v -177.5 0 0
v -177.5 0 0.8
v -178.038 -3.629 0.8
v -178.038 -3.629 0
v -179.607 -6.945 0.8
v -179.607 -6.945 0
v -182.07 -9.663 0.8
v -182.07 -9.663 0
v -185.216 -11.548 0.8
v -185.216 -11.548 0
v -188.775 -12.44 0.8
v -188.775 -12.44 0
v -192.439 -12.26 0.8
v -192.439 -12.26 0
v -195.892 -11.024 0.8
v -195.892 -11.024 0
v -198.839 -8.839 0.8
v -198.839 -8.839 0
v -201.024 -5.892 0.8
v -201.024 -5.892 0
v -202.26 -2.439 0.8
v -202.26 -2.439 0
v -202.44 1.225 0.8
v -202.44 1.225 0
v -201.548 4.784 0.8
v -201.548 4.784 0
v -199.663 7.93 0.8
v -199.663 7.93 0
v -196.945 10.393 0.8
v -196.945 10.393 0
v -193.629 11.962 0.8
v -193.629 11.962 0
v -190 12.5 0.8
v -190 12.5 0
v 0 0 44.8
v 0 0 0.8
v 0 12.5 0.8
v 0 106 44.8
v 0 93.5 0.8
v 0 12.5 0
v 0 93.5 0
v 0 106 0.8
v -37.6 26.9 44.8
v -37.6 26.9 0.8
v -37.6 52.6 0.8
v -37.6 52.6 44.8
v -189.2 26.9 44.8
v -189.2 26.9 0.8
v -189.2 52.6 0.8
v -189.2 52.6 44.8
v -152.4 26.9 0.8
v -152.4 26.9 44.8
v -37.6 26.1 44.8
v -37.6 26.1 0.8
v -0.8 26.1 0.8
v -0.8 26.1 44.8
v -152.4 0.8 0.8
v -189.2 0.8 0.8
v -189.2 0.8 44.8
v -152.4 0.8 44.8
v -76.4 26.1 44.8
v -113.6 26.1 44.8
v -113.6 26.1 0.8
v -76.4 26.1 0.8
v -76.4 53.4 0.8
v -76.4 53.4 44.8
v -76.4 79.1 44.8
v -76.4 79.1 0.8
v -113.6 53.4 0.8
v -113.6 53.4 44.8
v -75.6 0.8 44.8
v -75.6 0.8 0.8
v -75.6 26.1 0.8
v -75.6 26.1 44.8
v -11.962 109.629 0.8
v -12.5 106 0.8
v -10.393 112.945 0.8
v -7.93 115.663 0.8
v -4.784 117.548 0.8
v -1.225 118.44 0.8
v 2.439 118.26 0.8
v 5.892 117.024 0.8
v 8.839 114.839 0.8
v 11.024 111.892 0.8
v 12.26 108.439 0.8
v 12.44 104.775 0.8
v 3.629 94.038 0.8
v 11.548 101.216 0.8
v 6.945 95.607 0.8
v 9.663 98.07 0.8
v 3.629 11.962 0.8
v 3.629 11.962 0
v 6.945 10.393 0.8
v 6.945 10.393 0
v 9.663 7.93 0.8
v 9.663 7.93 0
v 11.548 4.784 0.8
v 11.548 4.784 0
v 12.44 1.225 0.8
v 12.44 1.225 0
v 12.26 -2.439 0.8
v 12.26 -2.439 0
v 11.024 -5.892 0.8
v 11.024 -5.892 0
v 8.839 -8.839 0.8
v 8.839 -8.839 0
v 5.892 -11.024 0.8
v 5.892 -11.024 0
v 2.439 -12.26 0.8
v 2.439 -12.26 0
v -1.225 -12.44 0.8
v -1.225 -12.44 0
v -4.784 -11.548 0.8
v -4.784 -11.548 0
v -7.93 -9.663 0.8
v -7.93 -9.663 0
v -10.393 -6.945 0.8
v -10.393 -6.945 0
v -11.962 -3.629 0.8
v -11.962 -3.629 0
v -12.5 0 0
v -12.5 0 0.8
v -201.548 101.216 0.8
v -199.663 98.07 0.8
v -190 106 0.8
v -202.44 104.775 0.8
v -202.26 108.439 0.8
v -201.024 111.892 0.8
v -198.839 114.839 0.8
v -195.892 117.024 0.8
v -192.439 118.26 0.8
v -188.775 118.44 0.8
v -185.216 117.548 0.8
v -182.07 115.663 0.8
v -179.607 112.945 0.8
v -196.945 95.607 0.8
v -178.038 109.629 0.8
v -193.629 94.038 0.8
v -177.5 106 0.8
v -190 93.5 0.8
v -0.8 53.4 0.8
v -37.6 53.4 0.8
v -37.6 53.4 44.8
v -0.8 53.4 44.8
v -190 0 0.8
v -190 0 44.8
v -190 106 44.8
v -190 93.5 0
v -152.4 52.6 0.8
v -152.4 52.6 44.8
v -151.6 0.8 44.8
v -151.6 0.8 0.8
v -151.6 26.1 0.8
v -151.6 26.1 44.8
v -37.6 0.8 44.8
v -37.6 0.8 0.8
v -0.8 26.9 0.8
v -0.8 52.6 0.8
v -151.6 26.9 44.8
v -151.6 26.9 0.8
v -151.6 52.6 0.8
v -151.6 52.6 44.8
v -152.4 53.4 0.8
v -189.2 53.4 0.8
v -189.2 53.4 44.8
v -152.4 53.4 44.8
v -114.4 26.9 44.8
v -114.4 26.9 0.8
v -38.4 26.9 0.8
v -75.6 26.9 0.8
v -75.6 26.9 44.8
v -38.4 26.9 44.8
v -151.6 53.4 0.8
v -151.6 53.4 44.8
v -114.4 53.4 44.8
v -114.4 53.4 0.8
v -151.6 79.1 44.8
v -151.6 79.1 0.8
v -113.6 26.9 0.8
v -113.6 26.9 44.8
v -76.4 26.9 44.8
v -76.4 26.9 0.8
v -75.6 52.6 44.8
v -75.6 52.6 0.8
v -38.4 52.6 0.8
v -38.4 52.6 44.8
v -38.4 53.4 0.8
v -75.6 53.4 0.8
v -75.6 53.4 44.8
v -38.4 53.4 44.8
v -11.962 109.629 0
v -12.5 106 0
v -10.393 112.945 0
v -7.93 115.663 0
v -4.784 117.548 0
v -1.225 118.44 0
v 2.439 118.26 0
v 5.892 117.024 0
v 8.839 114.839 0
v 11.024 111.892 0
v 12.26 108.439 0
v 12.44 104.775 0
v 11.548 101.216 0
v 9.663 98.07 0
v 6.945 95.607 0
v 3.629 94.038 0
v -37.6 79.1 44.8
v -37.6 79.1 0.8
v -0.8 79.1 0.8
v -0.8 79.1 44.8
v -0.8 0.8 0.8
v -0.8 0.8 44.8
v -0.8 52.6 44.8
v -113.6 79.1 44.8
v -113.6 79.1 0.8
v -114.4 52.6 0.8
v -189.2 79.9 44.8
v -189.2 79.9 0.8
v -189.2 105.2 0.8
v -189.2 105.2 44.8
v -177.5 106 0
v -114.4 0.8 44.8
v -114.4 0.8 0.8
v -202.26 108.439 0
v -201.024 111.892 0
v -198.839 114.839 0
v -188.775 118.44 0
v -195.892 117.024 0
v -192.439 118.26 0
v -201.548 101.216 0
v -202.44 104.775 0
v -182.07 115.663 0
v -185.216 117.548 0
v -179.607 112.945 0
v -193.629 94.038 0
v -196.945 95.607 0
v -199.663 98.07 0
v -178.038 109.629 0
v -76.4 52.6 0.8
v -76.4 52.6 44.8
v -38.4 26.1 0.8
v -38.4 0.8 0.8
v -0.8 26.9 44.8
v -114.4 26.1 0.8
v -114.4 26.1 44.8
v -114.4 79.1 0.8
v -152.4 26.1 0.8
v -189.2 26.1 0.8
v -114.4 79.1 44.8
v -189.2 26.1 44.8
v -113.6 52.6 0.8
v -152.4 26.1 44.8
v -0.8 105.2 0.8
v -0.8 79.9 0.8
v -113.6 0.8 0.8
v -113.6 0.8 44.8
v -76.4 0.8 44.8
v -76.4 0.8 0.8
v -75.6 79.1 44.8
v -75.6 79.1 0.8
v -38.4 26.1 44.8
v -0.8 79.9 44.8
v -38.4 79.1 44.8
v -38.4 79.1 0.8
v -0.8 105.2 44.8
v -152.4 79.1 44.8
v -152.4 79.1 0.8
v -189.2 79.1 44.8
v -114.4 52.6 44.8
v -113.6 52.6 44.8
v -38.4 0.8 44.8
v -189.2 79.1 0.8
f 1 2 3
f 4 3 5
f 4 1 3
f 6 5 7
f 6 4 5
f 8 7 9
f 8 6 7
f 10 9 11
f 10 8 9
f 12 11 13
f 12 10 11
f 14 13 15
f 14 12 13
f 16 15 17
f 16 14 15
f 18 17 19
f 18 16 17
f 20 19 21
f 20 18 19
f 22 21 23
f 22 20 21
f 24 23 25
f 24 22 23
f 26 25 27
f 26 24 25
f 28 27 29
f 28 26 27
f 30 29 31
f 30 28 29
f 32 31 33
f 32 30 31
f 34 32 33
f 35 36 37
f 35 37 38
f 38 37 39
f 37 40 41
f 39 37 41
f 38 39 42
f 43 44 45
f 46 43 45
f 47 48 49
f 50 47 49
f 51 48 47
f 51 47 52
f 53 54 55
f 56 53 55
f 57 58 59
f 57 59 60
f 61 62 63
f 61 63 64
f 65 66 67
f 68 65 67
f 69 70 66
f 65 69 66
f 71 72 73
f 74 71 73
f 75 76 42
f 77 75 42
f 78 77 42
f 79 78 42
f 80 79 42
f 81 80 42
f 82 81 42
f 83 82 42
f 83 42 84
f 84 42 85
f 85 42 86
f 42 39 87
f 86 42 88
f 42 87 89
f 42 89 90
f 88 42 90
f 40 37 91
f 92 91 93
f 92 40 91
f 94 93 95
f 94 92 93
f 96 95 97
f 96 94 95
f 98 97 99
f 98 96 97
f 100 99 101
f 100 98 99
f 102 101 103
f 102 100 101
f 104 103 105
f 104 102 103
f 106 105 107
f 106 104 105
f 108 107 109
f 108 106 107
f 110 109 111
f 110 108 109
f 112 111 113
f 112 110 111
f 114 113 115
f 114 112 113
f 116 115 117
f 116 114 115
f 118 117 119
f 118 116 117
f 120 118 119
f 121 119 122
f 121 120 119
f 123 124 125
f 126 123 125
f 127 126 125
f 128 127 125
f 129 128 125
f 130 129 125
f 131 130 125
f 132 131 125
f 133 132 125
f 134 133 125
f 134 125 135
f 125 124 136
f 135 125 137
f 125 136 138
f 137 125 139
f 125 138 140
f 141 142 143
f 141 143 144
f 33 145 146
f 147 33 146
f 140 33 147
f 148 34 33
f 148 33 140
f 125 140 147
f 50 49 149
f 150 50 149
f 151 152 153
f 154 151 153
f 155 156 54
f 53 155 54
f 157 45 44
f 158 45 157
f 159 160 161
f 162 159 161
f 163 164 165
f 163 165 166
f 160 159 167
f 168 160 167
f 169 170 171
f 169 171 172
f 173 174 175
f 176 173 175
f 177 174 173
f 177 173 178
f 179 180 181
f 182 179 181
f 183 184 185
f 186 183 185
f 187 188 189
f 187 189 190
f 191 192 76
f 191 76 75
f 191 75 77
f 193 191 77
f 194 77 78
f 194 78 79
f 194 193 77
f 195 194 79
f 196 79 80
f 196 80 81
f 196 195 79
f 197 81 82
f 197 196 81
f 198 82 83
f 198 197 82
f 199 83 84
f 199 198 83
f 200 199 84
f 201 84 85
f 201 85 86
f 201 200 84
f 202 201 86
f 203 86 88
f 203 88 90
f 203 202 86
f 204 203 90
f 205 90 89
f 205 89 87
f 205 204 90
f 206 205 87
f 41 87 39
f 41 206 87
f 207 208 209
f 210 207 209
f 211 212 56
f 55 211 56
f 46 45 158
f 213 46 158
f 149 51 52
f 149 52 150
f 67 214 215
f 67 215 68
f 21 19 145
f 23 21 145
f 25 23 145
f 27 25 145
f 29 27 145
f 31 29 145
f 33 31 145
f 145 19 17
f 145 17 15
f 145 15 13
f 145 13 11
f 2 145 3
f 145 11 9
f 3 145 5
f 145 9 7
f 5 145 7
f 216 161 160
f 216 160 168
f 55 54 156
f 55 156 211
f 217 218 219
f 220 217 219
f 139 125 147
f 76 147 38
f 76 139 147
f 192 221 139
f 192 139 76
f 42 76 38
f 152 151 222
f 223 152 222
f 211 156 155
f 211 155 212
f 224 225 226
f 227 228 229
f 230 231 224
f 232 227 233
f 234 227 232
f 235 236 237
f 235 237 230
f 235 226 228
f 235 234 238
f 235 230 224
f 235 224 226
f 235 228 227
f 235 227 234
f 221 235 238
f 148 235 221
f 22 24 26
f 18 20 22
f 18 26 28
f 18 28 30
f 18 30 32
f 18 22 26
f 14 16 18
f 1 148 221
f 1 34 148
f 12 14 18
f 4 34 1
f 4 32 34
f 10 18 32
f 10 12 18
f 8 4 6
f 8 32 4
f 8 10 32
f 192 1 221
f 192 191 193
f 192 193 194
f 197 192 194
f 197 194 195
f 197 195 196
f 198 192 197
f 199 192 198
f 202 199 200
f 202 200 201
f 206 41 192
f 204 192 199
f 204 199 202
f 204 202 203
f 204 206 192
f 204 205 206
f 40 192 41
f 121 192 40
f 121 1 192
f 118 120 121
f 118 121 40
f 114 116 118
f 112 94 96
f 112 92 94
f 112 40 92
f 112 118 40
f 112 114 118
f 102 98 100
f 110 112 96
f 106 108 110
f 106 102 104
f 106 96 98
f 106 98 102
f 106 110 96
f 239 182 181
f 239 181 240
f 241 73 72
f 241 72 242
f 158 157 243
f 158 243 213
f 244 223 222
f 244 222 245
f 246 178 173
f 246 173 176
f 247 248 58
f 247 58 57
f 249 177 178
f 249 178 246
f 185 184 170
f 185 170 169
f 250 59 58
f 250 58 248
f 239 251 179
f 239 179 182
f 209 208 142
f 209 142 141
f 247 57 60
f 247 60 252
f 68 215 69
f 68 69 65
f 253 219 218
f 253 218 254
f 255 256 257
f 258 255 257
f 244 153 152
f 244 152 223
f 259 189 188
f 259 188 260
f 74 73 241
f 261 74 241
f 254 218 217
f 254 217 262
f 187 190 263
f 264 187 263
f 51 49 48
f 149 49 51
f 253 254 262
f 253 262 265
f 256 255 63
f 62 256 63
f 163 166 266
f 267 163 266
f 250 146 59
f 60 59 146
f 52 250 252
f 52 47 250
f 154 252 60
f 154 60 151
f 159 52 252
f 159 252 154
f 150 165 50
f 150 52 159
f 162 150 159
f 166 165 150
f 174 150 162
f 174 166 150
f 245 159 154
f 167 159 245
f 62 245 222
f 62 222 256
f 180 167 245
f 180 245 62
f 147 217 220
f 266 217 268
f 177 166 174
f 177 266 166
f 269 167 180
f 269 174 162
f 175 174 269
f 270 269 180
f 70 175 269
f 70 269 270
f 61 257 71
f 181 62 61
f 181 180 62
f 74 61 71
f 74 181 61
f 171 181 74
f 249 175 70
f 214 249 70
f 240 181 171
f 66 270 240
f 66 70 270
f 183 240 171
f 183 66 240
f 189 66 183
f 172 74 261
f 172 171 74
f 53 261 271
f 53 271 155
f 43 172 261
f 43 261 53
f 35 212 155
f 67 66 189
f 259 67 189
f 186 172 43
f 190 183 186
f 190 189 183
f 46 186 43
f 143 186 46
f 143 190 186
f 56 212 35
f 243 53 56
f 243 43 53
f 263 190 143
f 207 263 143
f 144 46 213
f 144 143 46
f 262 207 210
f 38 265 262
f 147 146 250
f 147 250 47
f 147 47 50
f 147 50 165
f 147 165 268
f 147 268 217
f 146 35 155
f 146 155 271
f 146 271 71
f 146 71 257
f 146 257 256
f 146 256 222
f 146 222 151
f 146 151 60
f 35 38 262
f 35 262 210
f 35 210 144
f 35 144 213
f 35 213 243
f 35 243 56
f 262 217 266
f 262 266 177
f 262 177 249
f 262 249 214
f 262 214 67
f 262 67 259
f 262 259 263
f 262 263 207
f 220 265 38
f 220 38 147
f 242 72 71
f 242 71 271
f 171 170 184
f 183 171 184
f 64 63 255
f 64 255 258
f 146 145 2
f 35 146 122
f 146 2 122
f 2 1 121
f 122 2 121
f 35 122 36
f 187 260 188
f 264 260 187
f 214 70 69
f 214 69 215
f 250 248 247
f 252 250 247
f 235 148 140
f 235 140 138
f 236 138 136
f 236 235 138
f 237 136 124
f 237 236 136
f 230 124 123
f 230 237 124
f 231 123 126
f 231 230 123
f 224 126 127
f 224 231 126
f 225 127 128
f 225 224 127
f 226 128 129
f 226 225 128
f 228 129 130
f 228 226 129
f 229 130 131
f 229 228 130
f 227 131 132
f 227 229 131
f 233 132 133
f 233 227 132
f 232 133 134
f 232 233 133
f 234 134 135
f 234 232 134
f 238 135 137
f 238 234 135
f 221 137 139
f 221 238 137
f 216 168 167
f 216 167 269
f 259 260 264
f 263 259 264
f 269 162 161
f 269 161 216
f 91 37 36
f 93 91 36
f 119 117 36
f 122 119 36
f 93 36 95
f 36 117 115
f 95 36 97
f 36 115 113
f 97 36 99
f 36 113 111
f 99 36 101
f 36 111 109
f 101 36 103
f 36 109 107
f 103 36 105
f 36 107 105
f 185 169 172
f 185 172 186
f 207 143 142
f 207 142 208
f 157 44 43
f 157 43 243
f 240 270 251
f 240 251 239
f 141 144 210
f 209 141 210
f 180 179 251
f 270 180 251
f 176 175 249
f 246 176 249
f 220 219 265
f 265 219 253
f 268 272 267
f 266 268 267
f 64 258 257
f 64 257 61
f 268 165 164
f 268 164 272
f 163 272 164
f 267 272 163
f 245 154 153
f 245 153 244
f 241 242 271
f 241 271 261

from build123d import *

# Parameters (mm, degrees)
F0_W     = 190
F0_H     = 106
F1_DEPTH = 0.8
F2_W     = 190
F2_H     = 106
F2_W_2   = 36.8
F2_H_2   = 25.3
F2_W_3   = 37.2
F2_H_3   = 25.7
F2_W_4   = 188.4
F3_DEPTH = 44
F4_R     = 12.5
F5_DEPTH = 0.8


# Not quite as in the source:
# - a feature names something its author has since deleted; it is built from what else it names


with BuildPart() as f1:
    # F0 (on Top) → F1 (new body)
    with BuildSketch(Plane.XY):
        with Locations((-95, 53)):
            Rectangle(F0_W, F0_H)
    extrude(amount=F1_DEPTH)

    # F2 (on face) → F3 (join)
    with BuildSketch(Plane.XY.offset(0.8)):
        with Locations((-95, 53)):
            Rectangle(F2_W, F2_H)
        with Locations((-170.8, 13.45)):
            Rectangle(F2_W_2, F2_H_2, mode=Mode.SUBTRACT)
        with Locations((-133, 13.45)):
            Rectangle(F2_W_3, F2_H_2, mode=Mode.SUBTRACT)
        with Locations((-170.8, 39.75)):
            Rectangle(F2_W_2, F2_H_3, mode=Mode.SUBTRACT)
        with Locations((-133, 39.75)):
            Rectangle(F2_W_3, F2_H_3, mode=Mode.SUBTRACT)
        with Locations((-95, 13.45)):
            Rectangle(F2_W_3, F2_H_2, mode=Mode.SUBTRACT)
        with Locations((-57, 13.45)):
            Rectangle(F2_W_3, F2_H_2, mode=Mode.SUBTRACT)
        with Locations((-19.2, 13.45)):
            Rectangle(F2_W_2, F2_H_2, mode=Mode.SUBTRACT)
        with Locations((-95, 39.75)):
            Rectangle(F2_W_3, F2_H_3, mode=Mode.SUBTRACT)
        with Locations((-57, 39.75)):
            Rectangle(F2_W_3, F2_H_3, mode=Mode.SUBTRACT)
        with Locations((-19.2, 39.75)):
            Rectangle(F2_W_2, F2_H_3, mode=Mode.SUBTRACT)
        with Locations((-170.8, 66.25)):
            Rectangle(F2_W_2, F2_H_3, mode=Mode.SUBTRACT)
        with Locations((-133, 66.25)):
            Rectangle(F2_W_3, F2_H_3, mode=Mode.SUBTRACT)
        with Locations((-95, 66.25)):
            Rectangle(F2_W_3, F2_H_3, mode=Mode.SUBTRACT)
        with Locations((-57, 66.25)):
            Rectangle(F2_W_3, F2_H_3, mode=Mode.SUBTRACT)
        with Locations((-19.2, 66.25)):
            Rectangle(F2_W_2, F2_H_3, mode=Mode.SUBTRACT)
        with Locations((-95, 92.55)):
            Rectangle(F2_W_4, F2_H_2, mode=Mode.SUBTRACT)
    extrude(amount=F3_DEPTH)

    # F4 (on face) → F5 (join)
    with BuildSketch(Plane(origin=(0, 0, 0), x_dir=(1, 0, 0), z_dir=(0, 0, -1))):
        Circle(F4_R)
        with Locations((-190, 0)):
            Circle(F4_R)
        with Locations((-190, -106)):
            Circle(F4_R)
        with Locations((0, -106)):
            Circle(F4_R)
    extrude(amount=-F5_DEPTH)


solid = f1.part
